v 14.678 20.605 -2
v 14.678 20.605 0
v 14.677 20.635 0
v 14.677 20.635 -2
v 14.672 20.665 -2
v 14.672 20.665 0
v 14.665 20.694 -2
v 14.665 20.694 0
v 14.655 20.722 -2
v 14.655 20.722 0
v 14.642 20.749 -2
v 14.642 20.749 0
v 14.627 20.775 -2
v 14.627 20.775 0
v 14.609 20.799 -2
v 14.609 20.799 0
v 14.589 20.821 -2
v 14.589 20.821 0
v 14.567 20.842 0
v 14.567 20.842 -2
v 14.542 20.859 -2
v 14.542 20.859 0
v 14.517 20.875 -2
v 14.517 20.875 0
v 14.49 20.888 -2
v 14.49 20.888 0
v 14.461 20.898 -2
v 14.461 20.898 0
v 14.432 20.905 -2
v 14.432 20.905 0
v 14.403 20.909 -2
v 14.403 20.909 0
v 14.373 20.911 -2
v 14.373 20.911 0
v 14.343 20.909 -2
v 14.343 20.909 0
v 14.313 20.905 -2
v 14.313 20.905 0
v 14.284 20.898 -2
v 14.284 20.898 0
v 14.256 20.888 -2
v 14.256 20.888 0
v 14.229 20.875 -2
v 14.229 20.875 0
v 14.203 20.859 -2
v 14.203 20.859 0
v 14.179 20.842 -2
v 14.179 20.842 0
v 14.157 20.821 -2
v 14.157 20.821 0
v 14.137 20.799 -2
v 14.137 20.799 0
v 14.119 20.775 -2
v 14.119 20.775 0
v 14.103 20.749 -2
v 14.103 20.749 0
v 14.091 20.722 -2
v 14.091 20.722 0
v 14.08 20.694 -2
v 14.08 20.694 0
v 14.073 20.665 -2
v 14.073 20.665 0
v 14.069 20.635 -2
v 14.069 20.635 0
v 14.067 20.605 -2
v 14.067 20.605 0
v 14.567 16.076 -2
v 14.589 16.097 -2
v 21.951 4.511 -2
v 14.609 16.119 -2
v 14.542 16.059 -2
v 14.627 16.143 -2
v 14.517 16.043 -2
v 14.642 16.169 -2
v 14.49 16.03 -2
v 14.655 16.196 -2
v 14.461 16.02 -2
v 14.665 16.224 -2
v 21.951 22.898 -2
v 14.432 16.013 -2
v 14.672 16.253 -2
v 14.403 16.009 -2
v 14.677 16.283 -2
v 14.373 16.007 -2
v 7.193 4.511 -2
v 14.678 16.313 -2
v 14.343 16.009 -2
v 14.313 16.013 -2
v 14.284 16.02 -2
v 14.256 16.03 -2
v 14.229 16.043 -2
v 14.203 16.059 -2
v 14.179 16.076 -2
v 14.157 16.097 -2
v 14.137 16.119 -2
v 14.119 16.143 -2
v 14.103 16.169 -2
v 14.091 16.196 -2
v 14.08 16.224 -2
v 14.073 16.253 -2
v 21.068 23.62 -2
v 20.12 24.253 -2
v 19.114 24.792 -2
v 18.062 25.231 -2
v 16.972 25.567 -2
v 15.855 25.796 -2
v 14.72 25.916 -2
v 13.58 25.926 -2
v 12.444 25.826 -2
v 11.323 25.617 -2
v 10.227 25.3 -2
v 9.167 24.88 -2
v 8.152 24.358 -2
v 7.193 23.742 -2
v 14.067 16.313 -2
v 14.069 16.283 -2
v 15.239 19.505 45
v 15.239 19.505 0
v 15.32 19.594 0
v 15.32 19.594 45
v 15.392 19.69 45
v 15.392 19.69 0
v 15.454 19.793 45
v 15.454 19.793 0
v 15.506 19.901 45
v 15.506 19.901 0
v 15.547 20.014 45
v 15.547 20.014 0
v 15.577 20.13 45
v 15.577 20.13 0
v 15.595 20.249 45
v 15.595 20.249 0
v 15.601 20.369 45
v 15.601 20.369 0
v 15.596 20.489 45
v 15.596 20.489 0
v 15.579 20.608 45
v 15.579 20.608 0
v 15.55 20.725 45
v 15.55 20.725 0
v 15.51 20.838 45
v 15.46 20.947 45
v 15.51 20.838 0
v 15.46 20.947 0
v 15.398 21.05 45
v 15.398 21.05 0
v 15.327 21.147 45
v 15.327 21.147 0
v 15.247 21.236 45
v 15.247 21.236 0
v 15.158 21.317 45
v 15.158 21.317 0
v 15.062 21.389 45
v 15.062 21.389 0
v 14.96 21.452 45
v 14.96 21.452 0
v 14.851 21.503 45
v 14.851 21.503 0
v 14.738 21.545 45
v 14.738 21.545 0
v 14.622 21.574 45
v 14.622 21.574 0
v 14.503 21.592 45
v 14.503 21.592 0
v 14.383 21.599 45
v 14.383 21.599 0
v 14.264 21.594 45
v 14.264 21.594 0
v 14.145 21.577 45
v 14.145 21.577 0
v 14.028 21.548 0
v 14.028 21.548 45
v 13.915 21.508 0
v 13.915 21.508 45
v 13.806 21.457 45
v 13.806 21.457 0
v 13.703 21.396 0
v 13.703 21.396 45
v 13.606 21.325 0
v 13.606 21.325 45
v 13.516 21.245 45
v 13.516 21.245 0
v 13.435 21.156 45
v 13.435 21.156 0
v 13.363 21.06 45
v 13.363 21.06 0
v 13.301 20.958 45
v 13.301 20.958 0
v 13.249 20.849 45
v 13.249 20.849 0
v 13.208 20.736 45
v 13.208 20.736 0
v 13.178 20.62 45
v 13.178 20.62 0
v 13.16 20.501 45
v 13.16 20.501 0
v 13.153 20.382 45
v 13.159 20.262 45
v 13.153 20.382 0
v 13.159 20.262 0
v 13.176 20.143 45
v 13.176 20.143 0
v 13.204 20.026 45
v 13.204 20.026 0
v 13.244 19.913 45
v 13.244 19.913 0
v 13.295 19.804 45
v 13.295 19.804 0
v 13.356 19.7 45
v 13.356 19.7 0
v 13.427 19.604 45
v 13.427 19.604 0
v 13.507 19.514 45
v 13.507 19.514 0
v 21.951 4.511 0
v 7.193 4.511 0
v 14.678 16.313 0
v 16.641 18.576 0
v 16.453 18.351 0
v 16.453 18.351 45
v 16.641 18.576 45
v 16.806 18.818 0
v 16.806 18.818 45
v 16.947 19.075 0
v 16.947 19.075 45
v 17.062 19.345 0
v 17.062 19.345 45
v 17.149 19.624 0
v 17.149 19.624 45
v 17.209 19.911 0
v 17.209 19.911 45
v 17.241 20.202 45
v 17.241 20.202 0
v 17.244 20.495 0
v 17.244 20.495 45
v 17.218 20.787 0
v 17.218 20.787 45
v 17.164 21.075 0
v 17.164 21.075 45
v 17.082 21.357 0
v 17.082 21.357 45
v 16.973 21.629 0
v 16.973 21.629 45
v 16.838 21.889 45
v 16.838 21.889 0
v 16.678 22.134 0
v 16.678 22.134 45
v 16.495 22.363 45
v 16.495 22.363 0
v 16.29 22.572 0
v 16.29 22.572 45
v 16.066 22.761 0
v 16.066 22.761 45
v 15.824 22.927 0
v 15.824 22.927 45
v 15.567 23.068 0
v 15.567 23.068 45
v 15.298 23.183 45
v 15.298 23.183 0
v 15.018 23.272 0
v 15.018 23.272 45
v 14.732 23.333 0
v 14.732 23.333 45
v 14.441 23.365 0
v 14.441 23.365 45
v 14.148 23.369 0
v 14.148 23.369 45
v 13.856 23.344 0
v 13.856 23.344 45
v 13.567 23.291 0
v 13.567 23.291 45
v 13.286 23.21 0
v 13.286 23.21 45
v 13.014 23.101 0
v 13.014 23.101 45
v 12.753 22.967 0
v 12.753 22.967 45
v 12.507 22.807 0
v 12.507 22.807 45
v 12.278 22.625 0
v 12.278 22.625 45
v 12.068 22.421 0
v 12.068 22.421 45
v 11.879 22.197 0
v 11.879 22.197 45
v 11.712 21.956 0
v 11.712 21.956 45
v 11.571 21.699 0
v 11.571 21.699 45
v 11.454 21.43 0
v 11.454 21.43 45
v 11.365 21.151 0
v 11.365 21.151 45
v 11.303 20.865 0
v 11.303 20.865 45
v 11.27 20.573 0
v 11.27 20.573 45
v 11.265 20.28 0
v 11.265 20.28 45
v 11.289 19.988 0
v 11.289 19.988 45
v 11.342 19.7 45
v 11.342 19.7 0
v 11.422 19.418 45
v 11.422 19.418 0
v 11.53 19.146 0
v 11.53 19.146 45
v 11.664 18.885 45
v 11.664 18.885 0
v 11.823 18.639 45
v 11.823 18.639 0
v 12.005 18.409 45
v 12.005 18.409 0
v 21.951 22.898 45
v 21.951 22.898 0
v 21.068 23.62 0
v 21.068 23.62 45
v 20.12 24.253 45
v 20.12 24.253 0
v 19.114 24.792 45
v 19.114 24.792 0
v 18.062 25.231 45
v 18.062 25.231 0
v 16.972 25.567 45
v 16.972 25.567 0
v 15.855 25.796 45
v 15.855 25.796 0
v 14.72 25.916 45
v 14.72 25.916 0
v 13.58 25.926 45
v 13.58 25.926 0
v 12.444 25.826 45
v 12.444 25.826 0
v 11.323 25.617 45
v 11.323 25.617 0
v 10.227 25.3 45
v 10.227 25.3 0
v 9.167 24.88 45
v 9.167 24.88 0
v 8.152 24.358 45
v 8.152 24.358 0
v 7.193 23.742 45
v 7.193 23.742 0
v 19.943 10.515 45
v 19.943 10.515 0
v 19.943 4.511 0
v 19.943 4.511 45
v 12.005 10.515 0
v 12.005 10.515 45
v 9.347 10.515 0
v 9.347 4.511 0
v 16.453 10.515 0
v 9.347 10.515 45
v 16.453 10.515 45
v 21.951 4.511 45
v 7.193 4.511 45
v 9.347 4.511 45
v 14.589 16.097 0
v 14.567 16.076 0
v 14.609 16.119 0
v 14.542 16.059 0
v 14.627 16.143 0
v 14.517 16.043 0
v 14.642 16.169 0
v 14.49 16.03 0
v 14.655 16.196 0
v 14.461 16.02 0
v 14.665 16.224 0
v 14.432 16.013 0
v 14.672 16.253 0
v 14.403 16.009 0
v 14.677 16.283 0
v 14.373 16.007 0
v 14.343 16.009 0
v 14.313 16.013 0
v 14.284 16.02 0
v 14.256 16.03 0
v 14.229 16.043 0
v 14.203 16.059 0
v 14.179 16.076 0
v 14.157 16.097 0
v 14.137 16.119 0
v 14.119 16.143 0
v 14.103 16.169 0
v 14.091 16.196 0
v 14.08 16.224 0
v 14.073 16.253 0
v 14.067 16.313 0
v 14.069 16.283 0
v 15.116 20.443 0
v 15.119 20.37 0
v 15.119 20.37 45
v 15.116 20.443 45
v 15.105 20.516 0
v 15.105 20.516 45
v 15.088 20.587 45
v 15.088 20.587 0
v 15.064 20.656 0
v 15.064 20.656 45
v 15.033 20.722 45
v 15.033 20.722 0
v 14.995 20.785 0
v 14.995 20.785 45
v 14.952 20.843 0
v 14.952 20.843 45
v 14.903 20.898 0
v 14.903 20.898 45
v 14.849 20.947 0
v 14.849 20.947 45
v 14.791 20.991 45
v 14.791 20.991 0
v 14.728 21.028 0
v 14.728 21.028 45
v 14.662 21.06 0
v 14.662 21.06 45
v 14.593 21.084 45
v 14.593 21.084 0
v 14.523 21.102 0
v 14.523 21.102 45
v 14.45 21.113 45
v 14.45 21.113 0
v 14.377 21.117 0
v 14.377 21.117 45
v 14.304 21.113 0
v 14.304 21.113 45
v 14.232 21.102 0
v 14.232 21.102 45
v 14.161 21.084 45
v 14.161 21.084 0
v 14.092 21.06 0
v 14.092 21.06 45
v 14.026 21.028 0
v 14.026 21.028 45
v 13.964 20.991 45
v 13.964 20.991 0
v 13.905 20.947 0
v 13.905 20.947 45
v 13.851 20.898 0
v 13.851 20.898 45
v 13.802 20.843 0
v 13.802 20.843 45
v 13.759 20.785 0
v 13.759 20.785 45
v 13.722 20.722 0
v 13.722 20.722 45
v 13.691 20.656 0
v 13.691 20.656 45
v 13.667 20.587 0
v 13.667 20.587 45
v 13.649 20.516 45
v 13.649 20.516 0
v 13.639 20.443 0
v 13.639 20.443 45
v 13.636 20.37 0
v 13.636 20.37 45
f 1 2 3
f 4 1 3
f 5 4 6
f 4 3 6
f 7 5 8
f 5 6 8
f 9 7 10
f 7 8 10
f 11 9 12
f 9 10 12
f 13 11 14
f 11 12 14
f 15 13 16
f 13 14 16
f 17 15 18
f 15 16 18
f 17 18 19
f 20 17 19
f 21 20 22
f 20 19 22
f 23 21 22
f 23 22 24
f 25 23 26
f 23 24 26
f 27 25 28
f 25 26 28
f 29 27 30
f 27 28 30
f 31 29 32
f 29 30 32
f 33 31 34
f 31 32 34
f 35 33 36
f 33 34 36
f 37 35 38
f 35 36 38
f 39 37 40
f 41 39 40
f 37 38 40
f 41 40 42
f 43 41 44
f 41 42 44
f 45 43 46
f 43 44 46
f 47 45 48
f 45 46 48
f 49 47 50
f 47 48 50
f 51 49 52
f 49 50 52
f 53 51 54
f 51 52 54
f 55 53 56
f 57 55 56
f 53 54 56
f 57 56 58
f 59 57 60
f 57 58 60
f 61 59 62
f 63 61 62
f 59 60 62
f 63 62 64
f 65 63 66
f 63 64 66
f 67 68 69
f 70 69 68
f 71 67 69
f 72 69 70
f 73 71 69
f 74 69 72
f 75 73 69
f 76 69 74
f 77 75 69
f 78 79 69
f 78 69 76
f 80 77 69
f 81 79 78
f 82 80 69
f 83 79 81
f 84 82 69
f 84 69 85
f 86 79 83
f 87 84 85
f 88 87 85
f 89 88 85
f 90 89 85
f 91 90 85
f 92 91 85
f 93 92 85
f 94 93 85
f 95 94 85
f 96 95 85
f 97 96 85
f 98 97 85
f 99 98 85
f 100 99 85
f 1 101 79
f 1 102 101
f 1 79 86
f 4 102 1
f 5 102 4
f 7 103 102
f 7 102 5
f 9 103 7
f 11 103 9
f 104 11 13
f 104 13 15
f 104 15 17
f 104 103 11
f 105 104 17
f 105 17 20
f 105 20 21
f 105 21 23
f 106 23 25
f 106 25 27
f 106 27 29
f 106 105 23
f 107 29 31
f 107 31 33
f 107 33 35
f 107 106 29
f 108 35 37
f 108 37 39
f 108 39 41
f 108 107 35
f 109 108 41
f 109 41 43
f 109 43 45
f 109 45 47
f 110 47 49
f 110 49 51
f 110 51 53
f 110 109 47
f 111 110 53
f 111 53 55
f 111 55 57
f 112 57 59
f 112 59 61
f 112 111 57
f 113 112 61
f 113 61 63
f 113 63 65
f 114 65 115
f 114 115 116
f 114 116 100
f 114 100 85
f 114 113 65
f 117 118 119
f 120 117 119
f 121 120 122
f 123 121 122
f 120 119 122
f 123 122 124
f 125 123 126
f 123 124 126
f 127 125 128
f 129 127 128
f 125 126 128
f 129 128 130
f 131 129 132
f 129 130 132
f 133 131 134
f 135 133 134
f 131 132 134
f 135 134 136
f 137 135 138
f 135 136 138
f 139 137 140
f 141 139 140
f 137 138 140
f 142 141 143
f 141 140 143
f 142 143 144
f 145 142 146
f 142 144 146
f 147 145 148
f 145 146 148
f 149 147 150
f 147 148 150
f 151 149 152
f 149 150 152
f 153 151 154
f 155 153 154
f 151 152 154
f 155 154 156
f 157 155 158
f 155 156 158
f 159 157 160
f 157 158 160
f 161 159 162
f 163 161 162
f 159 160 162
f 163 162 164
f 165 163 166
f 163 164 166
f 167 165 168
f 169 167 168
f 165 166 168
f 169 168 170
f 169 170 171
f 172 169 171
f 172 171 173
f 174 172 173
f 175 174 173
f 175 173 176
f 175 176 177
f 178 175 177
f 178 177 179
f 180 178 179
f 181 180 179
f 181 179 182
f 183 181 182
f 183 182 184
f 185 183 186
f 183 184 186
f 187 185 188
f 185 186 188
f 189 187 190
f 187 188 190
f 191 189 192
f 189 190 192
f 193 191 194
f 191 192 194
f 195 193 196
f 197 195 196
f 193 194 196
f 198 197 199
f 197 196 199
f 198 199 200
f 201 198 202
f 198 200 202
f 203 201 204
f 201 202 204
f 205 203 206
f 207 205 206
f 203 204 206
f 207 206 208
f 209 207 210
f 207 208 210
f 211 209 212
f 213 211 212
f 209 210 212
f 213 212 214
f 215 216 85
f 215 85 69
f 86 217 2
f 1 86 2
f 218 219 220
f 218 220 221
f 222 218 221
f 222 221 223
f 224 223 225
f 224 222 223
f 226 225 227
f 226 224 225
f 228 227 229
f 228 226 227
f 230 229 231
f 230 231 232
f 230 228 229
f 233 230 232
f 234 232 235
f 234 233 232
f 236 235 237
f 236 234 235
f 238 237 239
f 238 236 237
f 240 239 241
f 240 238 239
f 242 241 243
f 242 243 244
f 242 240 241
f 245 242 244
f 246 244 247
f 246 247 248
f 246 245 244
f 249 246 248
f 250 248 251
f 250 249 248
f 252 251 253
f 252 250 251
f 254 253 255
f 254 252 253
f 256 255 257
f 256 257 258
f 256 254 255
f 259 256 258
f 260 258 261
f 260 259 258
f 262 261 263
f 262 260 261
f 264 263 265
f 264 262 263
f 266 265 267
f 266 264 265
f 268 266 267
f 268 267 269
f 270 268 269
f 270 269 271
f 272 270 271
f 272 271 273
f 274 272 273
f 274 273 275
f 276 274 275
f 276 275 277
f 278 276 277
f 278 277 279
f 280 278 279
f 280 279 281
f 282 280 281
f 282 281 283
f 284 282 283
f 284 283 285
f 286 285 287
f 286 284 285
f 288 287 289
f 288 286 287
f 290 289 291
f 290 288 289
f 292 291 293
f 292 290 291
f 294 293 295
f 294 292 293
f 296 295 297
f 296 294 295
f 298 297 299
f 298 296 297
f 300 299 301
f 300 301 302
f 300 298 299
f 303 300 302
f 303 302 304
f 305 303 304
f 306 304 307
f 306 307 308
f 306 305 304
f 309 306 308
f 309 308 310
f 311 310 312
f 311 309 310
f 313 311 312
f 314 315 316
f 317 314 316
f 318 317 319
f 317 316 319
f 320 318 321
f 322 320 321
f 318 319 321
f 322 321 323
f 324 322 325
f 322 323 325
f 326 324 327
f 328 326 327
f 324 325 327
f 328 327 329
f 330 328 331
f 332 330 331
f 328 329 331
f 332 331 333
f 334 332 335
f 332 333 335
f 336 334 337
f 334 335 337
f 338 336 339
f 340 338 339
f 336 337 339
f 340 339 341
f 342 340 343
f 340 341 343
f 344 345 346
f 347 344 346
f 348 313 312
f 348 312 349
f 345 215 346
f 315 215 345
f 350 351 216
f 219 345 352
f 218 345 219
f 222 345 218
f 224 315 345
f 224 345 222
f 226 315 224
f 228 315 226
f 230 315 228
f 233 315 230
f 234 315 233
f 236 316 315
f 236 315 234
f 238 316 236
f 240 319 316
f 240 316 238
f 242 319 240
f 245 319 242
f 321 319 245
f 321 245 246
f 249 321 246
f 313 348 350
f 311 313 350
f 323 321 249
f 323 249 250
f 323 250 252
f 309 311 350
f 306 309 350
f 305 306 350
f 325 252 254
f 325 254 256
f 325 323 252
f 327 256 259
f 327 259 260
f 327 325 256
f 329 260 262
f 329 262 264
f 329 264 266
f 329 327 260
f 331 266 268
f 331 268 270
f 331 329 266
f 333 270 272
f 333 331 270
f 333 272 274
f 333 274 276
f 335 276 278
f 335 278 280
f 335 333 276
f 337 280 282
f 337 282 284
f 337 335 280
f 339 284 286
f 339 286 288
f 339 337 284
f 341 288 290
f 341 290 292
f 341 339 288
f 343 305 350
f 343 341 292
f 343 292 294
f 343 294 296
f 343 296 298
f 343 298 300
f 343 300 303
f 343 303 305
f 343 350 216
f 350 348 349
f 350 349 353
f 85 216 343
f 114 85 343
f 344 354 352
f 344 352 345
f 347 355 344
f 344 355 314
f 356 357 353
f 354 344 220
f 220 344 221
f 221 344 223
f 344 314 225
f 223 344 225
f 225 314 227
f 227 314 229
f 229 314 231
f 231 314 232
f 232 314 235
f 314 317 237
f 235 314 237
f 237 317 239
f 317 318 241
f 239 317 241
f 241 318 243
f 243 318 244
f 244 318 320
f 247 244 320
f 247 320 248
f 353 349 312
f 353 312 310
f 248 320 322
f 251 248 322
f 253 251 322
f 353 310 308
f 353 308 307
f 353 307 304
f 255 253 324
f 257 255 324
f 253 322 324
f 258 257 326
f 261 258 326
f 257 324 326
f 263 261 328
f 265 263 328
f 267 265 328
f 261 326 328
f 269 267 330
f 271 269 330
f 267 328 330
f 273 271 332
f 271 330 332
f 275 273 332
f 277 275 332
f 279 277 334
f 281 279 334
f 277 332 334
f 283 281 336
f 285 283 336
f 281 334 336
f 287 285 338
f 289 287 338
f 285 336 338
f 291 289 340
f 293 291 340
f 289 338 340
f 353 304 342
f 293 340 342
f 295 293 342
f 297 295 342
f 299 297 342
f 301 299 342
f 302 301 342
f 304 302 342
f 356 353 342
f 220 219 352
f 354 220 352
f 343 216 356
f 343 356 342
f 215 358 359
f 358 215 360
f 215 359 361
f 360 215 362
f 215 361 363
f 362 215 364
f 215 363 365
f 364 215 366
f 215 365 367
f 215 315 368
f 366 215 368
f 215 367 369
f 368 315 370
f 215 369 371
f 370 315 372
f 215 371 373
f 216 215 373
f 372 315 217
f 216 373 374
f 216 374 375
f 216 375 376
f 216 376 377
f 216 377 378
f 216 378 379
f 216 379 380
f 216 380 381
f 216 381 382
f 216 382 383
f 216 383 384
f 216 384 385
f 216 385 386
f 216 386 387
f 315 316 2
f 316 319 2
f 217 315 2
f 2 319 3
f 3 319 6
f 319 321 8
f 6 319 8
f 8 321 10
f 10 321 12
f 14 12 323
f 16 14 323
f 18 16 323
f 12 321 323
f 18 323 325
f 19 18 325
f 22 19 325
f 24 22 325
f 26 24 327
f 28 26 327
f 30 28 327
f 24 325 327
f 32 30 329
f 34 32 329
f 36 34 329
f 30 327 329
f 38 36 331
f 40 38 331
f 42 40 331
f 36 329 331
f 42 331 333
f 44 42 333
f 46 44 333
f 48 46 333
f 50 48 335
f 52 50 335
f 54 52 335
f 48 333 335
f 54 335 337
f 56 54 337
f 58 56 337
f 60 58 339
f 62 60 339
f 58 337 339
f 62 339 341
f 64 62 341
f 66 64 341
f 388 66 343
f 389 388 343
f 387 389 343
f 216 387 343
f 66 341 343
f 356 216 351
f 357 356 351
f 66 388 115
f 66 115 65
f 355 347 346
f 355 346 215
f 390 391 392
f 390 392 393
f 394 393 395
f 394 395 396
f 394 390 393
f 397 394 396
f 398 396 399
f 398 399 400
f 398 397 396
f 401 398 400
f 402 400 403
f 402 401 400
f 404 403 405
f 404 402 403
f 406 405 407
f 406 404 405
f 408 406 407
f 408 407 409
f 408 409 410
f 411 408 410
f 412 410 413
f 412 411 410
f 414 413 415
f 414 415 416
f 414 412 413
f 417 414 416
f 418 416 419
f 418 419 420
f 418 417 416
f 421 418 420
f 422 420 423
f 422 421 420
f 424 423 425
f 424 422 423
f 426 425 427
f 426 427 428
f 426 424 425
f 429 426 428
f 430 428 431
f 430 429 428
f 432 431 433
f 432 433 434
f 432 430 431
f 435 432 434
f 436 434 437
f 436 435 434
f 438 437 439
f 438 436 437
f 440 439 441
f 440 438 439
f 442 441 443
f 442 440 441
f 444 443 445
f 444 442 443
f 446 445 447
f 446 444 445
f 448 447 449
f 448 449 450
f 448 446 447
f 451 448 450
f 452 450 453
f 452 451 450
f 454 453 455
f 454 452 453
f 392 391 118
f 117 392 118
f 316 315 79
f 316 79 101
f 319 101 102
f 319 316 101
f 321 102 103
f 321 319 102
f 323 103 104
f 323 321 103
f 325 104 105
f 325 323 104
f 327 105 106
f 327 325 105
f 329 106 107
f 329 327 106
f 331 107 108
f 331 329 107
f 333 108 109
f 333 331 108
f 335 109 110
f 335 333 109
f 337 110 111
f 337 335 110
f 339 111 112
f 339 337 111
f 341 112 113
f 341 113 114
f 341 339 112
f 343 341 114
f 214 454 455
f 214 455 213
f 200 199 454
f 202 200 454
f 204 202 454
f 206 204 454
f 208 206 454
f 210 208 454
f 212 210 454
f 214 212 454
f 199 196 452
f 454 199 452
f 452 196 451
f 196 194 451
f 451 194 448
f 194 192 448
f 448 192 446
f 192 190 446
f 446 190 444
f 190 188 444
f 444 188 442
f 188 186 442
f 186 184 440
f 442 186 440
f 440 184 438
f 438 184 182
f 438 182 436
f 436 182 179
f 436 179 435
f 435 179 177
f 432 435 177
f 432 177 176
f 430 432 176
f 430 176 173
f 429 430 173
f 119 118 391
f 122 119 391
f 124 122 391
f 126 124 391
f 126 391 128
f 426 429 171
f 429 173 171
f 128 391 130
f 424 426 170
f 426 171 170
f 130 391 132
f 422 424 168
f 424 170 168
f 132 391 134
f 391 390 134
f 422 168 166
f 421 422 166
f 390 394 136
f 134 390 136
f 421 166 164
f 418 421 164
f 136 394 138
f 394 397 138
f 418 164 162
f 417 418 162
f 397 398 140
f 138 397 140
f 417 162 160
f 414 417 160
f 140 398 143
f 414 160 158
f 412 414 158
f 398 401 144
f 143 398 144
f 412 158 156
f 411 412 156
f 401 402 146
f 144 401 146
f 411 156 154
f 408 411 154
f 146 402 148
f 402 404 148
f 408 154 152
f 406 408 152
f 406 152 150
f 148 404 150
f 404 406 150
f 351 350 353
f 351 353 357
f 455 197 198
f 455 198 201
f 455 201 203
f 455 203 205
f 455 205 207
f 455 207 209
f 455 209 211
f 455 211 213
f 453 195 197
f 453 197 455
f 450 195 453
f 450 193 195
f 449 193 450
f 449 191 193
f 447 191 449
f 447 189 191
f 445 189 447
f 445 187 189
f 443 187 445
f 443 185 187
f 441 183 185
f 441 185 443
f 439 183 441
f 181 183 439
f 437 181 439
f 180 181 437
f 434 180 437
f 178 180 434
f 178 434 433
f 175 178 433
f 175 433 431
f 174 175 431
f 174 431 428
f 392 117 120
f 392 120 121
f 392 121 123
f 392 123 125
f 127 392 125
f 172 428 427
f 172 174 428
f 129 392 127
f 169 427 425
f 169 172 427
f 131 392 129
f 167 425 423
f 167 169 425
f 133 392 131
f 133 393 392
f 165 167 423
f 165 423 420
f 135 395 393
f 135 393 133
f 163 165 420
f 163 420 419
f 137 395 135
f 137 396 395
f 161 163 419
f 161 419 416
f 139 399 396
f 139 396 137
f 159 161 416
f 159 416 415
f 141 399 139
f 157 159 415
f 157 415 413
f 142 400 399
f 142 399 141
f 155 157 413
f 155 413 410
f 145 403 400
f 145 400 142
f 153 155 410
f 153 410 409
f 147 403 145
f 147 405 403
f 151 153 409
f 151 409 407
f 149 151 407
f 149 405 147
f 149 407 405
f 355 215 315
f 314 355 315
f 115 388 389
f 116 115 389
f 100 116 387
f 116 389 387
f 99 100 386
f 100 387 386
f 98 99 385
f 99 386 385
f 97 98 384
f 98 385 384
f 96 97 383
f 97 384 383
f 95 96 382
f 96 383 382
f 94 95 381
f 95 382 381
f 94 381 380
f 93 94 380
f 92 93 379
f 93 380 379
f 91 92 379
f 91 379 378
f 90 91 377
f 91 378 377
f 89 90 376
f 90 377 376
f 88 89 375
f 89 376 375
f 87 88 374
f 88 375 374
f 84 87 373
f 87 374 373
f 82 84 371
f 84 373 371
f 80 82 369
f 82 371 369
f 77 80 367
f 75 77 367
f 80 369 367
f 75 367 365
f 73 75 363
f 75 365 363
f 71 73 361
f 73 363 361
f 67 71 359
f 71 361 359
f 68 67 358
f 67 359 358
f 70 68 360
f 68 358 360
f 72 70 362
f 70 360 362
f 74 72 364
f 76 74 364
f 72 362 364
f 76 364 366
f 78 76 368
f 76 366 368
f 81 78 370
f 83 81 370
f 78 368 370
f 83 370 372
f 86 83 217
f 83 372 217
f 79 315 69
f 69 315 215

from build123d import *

# Parameters (mm, degrees)
PAD002_DEPTH = 45
PAD003_DEPTH = 45
PAD004_DEPTH = 2


with BuildPart() as outside:
    # Sketch002 → Pad002 (new body)
    with BuildSketch(Plane.XY):
        with BuildLine():
            Line((7.192789, 4.510786), (7.192789, 23.741941))
            ThreePointArc((21.950985, 22.89772), (14.720399, 25.916026), (7.192789, 23.741941))
            Line((21.950985, 4.510786), (21.950985, 22.89772))
            Line((19.943127, 4.510786), (21.950985, 4.510786))
            Line((19.943127, 10.515066), (19.943127, 4.510786))
            Line((16.453182, 10.515066), (19.943127, 10.515066))
            Line((16.453182, 18.351023), (16.453182, 10.515066))
            ThreePointArc((16.453182, 18.351023), (14.294109, 23.370772), (12.004645, 18.409136))
            Line((12.004645, 18.409136), (12.004645, 10.515066))
            Line((12.004645, 10.515066), (9.34679, 10.515066))
            Line((9.34679, 10.515066), (9.34679, 4.510786))
            Line((7.192789, 4.510786), (9.34679, 4.510786))
        make_face()
    extrude(amount=PAD002_DEPTH)


with BuildPart() as center:
    # Sketch003 → Pad003 (new body)
    with BuildSketch(Plane.XY):
        with BuildLine():
            ThreePointArc((15.238704, 19.505432), (14.383488, 21.598997), (13.50708, 19.514215))
            Line((13.635763, 20.370392), (13.50708, 19.514215))
            ThreePointArc((15.118796, 20.370309), (14.377322, 21.116533), (13.635763, 20.370392))
            Line((15.118796, 20.370309), (15.238704, 19.505432))
        make_face()
    extrude(amount=PAD003_DEPTH)


with BuildPart() as back:
    # Sketch004 → Pad004 (new body)
    with BuildSketch(Plane.XY):
        with BuildLine():
            Line((7.192789, 4.510786), (7.192789, 23.741941))
            ThreePointArc((21.950985, 22.89772), (14.720399, 25.916026), (7.192789, 23.741941))
            Line((21.950985, 22.89772), (21.950985, 4.510786))
            Line((7.192789, 4.510786), (21.950985, 4.510786))
        make_face()
        with BuildLine():
            ThreePointArc((14.067295, 16.312599), (14.372757, 16.007137), (14.678219, 16.312599))
            Line((14.678219, 16.312599), (14.678219, 20.60549))
            ThreePointArc((14.678219, 20.60549), (14.372757, 20.910952), (14.067295, 20.60549))
            Line((14.067295, 16.312599), (14.067295, 20.60549))
        make_face(mode=Mode.SUBTRACT)
    extrude(amount=-PAD004_DEPTH)


solid = Compound([outside.part, center.part, back.part])
